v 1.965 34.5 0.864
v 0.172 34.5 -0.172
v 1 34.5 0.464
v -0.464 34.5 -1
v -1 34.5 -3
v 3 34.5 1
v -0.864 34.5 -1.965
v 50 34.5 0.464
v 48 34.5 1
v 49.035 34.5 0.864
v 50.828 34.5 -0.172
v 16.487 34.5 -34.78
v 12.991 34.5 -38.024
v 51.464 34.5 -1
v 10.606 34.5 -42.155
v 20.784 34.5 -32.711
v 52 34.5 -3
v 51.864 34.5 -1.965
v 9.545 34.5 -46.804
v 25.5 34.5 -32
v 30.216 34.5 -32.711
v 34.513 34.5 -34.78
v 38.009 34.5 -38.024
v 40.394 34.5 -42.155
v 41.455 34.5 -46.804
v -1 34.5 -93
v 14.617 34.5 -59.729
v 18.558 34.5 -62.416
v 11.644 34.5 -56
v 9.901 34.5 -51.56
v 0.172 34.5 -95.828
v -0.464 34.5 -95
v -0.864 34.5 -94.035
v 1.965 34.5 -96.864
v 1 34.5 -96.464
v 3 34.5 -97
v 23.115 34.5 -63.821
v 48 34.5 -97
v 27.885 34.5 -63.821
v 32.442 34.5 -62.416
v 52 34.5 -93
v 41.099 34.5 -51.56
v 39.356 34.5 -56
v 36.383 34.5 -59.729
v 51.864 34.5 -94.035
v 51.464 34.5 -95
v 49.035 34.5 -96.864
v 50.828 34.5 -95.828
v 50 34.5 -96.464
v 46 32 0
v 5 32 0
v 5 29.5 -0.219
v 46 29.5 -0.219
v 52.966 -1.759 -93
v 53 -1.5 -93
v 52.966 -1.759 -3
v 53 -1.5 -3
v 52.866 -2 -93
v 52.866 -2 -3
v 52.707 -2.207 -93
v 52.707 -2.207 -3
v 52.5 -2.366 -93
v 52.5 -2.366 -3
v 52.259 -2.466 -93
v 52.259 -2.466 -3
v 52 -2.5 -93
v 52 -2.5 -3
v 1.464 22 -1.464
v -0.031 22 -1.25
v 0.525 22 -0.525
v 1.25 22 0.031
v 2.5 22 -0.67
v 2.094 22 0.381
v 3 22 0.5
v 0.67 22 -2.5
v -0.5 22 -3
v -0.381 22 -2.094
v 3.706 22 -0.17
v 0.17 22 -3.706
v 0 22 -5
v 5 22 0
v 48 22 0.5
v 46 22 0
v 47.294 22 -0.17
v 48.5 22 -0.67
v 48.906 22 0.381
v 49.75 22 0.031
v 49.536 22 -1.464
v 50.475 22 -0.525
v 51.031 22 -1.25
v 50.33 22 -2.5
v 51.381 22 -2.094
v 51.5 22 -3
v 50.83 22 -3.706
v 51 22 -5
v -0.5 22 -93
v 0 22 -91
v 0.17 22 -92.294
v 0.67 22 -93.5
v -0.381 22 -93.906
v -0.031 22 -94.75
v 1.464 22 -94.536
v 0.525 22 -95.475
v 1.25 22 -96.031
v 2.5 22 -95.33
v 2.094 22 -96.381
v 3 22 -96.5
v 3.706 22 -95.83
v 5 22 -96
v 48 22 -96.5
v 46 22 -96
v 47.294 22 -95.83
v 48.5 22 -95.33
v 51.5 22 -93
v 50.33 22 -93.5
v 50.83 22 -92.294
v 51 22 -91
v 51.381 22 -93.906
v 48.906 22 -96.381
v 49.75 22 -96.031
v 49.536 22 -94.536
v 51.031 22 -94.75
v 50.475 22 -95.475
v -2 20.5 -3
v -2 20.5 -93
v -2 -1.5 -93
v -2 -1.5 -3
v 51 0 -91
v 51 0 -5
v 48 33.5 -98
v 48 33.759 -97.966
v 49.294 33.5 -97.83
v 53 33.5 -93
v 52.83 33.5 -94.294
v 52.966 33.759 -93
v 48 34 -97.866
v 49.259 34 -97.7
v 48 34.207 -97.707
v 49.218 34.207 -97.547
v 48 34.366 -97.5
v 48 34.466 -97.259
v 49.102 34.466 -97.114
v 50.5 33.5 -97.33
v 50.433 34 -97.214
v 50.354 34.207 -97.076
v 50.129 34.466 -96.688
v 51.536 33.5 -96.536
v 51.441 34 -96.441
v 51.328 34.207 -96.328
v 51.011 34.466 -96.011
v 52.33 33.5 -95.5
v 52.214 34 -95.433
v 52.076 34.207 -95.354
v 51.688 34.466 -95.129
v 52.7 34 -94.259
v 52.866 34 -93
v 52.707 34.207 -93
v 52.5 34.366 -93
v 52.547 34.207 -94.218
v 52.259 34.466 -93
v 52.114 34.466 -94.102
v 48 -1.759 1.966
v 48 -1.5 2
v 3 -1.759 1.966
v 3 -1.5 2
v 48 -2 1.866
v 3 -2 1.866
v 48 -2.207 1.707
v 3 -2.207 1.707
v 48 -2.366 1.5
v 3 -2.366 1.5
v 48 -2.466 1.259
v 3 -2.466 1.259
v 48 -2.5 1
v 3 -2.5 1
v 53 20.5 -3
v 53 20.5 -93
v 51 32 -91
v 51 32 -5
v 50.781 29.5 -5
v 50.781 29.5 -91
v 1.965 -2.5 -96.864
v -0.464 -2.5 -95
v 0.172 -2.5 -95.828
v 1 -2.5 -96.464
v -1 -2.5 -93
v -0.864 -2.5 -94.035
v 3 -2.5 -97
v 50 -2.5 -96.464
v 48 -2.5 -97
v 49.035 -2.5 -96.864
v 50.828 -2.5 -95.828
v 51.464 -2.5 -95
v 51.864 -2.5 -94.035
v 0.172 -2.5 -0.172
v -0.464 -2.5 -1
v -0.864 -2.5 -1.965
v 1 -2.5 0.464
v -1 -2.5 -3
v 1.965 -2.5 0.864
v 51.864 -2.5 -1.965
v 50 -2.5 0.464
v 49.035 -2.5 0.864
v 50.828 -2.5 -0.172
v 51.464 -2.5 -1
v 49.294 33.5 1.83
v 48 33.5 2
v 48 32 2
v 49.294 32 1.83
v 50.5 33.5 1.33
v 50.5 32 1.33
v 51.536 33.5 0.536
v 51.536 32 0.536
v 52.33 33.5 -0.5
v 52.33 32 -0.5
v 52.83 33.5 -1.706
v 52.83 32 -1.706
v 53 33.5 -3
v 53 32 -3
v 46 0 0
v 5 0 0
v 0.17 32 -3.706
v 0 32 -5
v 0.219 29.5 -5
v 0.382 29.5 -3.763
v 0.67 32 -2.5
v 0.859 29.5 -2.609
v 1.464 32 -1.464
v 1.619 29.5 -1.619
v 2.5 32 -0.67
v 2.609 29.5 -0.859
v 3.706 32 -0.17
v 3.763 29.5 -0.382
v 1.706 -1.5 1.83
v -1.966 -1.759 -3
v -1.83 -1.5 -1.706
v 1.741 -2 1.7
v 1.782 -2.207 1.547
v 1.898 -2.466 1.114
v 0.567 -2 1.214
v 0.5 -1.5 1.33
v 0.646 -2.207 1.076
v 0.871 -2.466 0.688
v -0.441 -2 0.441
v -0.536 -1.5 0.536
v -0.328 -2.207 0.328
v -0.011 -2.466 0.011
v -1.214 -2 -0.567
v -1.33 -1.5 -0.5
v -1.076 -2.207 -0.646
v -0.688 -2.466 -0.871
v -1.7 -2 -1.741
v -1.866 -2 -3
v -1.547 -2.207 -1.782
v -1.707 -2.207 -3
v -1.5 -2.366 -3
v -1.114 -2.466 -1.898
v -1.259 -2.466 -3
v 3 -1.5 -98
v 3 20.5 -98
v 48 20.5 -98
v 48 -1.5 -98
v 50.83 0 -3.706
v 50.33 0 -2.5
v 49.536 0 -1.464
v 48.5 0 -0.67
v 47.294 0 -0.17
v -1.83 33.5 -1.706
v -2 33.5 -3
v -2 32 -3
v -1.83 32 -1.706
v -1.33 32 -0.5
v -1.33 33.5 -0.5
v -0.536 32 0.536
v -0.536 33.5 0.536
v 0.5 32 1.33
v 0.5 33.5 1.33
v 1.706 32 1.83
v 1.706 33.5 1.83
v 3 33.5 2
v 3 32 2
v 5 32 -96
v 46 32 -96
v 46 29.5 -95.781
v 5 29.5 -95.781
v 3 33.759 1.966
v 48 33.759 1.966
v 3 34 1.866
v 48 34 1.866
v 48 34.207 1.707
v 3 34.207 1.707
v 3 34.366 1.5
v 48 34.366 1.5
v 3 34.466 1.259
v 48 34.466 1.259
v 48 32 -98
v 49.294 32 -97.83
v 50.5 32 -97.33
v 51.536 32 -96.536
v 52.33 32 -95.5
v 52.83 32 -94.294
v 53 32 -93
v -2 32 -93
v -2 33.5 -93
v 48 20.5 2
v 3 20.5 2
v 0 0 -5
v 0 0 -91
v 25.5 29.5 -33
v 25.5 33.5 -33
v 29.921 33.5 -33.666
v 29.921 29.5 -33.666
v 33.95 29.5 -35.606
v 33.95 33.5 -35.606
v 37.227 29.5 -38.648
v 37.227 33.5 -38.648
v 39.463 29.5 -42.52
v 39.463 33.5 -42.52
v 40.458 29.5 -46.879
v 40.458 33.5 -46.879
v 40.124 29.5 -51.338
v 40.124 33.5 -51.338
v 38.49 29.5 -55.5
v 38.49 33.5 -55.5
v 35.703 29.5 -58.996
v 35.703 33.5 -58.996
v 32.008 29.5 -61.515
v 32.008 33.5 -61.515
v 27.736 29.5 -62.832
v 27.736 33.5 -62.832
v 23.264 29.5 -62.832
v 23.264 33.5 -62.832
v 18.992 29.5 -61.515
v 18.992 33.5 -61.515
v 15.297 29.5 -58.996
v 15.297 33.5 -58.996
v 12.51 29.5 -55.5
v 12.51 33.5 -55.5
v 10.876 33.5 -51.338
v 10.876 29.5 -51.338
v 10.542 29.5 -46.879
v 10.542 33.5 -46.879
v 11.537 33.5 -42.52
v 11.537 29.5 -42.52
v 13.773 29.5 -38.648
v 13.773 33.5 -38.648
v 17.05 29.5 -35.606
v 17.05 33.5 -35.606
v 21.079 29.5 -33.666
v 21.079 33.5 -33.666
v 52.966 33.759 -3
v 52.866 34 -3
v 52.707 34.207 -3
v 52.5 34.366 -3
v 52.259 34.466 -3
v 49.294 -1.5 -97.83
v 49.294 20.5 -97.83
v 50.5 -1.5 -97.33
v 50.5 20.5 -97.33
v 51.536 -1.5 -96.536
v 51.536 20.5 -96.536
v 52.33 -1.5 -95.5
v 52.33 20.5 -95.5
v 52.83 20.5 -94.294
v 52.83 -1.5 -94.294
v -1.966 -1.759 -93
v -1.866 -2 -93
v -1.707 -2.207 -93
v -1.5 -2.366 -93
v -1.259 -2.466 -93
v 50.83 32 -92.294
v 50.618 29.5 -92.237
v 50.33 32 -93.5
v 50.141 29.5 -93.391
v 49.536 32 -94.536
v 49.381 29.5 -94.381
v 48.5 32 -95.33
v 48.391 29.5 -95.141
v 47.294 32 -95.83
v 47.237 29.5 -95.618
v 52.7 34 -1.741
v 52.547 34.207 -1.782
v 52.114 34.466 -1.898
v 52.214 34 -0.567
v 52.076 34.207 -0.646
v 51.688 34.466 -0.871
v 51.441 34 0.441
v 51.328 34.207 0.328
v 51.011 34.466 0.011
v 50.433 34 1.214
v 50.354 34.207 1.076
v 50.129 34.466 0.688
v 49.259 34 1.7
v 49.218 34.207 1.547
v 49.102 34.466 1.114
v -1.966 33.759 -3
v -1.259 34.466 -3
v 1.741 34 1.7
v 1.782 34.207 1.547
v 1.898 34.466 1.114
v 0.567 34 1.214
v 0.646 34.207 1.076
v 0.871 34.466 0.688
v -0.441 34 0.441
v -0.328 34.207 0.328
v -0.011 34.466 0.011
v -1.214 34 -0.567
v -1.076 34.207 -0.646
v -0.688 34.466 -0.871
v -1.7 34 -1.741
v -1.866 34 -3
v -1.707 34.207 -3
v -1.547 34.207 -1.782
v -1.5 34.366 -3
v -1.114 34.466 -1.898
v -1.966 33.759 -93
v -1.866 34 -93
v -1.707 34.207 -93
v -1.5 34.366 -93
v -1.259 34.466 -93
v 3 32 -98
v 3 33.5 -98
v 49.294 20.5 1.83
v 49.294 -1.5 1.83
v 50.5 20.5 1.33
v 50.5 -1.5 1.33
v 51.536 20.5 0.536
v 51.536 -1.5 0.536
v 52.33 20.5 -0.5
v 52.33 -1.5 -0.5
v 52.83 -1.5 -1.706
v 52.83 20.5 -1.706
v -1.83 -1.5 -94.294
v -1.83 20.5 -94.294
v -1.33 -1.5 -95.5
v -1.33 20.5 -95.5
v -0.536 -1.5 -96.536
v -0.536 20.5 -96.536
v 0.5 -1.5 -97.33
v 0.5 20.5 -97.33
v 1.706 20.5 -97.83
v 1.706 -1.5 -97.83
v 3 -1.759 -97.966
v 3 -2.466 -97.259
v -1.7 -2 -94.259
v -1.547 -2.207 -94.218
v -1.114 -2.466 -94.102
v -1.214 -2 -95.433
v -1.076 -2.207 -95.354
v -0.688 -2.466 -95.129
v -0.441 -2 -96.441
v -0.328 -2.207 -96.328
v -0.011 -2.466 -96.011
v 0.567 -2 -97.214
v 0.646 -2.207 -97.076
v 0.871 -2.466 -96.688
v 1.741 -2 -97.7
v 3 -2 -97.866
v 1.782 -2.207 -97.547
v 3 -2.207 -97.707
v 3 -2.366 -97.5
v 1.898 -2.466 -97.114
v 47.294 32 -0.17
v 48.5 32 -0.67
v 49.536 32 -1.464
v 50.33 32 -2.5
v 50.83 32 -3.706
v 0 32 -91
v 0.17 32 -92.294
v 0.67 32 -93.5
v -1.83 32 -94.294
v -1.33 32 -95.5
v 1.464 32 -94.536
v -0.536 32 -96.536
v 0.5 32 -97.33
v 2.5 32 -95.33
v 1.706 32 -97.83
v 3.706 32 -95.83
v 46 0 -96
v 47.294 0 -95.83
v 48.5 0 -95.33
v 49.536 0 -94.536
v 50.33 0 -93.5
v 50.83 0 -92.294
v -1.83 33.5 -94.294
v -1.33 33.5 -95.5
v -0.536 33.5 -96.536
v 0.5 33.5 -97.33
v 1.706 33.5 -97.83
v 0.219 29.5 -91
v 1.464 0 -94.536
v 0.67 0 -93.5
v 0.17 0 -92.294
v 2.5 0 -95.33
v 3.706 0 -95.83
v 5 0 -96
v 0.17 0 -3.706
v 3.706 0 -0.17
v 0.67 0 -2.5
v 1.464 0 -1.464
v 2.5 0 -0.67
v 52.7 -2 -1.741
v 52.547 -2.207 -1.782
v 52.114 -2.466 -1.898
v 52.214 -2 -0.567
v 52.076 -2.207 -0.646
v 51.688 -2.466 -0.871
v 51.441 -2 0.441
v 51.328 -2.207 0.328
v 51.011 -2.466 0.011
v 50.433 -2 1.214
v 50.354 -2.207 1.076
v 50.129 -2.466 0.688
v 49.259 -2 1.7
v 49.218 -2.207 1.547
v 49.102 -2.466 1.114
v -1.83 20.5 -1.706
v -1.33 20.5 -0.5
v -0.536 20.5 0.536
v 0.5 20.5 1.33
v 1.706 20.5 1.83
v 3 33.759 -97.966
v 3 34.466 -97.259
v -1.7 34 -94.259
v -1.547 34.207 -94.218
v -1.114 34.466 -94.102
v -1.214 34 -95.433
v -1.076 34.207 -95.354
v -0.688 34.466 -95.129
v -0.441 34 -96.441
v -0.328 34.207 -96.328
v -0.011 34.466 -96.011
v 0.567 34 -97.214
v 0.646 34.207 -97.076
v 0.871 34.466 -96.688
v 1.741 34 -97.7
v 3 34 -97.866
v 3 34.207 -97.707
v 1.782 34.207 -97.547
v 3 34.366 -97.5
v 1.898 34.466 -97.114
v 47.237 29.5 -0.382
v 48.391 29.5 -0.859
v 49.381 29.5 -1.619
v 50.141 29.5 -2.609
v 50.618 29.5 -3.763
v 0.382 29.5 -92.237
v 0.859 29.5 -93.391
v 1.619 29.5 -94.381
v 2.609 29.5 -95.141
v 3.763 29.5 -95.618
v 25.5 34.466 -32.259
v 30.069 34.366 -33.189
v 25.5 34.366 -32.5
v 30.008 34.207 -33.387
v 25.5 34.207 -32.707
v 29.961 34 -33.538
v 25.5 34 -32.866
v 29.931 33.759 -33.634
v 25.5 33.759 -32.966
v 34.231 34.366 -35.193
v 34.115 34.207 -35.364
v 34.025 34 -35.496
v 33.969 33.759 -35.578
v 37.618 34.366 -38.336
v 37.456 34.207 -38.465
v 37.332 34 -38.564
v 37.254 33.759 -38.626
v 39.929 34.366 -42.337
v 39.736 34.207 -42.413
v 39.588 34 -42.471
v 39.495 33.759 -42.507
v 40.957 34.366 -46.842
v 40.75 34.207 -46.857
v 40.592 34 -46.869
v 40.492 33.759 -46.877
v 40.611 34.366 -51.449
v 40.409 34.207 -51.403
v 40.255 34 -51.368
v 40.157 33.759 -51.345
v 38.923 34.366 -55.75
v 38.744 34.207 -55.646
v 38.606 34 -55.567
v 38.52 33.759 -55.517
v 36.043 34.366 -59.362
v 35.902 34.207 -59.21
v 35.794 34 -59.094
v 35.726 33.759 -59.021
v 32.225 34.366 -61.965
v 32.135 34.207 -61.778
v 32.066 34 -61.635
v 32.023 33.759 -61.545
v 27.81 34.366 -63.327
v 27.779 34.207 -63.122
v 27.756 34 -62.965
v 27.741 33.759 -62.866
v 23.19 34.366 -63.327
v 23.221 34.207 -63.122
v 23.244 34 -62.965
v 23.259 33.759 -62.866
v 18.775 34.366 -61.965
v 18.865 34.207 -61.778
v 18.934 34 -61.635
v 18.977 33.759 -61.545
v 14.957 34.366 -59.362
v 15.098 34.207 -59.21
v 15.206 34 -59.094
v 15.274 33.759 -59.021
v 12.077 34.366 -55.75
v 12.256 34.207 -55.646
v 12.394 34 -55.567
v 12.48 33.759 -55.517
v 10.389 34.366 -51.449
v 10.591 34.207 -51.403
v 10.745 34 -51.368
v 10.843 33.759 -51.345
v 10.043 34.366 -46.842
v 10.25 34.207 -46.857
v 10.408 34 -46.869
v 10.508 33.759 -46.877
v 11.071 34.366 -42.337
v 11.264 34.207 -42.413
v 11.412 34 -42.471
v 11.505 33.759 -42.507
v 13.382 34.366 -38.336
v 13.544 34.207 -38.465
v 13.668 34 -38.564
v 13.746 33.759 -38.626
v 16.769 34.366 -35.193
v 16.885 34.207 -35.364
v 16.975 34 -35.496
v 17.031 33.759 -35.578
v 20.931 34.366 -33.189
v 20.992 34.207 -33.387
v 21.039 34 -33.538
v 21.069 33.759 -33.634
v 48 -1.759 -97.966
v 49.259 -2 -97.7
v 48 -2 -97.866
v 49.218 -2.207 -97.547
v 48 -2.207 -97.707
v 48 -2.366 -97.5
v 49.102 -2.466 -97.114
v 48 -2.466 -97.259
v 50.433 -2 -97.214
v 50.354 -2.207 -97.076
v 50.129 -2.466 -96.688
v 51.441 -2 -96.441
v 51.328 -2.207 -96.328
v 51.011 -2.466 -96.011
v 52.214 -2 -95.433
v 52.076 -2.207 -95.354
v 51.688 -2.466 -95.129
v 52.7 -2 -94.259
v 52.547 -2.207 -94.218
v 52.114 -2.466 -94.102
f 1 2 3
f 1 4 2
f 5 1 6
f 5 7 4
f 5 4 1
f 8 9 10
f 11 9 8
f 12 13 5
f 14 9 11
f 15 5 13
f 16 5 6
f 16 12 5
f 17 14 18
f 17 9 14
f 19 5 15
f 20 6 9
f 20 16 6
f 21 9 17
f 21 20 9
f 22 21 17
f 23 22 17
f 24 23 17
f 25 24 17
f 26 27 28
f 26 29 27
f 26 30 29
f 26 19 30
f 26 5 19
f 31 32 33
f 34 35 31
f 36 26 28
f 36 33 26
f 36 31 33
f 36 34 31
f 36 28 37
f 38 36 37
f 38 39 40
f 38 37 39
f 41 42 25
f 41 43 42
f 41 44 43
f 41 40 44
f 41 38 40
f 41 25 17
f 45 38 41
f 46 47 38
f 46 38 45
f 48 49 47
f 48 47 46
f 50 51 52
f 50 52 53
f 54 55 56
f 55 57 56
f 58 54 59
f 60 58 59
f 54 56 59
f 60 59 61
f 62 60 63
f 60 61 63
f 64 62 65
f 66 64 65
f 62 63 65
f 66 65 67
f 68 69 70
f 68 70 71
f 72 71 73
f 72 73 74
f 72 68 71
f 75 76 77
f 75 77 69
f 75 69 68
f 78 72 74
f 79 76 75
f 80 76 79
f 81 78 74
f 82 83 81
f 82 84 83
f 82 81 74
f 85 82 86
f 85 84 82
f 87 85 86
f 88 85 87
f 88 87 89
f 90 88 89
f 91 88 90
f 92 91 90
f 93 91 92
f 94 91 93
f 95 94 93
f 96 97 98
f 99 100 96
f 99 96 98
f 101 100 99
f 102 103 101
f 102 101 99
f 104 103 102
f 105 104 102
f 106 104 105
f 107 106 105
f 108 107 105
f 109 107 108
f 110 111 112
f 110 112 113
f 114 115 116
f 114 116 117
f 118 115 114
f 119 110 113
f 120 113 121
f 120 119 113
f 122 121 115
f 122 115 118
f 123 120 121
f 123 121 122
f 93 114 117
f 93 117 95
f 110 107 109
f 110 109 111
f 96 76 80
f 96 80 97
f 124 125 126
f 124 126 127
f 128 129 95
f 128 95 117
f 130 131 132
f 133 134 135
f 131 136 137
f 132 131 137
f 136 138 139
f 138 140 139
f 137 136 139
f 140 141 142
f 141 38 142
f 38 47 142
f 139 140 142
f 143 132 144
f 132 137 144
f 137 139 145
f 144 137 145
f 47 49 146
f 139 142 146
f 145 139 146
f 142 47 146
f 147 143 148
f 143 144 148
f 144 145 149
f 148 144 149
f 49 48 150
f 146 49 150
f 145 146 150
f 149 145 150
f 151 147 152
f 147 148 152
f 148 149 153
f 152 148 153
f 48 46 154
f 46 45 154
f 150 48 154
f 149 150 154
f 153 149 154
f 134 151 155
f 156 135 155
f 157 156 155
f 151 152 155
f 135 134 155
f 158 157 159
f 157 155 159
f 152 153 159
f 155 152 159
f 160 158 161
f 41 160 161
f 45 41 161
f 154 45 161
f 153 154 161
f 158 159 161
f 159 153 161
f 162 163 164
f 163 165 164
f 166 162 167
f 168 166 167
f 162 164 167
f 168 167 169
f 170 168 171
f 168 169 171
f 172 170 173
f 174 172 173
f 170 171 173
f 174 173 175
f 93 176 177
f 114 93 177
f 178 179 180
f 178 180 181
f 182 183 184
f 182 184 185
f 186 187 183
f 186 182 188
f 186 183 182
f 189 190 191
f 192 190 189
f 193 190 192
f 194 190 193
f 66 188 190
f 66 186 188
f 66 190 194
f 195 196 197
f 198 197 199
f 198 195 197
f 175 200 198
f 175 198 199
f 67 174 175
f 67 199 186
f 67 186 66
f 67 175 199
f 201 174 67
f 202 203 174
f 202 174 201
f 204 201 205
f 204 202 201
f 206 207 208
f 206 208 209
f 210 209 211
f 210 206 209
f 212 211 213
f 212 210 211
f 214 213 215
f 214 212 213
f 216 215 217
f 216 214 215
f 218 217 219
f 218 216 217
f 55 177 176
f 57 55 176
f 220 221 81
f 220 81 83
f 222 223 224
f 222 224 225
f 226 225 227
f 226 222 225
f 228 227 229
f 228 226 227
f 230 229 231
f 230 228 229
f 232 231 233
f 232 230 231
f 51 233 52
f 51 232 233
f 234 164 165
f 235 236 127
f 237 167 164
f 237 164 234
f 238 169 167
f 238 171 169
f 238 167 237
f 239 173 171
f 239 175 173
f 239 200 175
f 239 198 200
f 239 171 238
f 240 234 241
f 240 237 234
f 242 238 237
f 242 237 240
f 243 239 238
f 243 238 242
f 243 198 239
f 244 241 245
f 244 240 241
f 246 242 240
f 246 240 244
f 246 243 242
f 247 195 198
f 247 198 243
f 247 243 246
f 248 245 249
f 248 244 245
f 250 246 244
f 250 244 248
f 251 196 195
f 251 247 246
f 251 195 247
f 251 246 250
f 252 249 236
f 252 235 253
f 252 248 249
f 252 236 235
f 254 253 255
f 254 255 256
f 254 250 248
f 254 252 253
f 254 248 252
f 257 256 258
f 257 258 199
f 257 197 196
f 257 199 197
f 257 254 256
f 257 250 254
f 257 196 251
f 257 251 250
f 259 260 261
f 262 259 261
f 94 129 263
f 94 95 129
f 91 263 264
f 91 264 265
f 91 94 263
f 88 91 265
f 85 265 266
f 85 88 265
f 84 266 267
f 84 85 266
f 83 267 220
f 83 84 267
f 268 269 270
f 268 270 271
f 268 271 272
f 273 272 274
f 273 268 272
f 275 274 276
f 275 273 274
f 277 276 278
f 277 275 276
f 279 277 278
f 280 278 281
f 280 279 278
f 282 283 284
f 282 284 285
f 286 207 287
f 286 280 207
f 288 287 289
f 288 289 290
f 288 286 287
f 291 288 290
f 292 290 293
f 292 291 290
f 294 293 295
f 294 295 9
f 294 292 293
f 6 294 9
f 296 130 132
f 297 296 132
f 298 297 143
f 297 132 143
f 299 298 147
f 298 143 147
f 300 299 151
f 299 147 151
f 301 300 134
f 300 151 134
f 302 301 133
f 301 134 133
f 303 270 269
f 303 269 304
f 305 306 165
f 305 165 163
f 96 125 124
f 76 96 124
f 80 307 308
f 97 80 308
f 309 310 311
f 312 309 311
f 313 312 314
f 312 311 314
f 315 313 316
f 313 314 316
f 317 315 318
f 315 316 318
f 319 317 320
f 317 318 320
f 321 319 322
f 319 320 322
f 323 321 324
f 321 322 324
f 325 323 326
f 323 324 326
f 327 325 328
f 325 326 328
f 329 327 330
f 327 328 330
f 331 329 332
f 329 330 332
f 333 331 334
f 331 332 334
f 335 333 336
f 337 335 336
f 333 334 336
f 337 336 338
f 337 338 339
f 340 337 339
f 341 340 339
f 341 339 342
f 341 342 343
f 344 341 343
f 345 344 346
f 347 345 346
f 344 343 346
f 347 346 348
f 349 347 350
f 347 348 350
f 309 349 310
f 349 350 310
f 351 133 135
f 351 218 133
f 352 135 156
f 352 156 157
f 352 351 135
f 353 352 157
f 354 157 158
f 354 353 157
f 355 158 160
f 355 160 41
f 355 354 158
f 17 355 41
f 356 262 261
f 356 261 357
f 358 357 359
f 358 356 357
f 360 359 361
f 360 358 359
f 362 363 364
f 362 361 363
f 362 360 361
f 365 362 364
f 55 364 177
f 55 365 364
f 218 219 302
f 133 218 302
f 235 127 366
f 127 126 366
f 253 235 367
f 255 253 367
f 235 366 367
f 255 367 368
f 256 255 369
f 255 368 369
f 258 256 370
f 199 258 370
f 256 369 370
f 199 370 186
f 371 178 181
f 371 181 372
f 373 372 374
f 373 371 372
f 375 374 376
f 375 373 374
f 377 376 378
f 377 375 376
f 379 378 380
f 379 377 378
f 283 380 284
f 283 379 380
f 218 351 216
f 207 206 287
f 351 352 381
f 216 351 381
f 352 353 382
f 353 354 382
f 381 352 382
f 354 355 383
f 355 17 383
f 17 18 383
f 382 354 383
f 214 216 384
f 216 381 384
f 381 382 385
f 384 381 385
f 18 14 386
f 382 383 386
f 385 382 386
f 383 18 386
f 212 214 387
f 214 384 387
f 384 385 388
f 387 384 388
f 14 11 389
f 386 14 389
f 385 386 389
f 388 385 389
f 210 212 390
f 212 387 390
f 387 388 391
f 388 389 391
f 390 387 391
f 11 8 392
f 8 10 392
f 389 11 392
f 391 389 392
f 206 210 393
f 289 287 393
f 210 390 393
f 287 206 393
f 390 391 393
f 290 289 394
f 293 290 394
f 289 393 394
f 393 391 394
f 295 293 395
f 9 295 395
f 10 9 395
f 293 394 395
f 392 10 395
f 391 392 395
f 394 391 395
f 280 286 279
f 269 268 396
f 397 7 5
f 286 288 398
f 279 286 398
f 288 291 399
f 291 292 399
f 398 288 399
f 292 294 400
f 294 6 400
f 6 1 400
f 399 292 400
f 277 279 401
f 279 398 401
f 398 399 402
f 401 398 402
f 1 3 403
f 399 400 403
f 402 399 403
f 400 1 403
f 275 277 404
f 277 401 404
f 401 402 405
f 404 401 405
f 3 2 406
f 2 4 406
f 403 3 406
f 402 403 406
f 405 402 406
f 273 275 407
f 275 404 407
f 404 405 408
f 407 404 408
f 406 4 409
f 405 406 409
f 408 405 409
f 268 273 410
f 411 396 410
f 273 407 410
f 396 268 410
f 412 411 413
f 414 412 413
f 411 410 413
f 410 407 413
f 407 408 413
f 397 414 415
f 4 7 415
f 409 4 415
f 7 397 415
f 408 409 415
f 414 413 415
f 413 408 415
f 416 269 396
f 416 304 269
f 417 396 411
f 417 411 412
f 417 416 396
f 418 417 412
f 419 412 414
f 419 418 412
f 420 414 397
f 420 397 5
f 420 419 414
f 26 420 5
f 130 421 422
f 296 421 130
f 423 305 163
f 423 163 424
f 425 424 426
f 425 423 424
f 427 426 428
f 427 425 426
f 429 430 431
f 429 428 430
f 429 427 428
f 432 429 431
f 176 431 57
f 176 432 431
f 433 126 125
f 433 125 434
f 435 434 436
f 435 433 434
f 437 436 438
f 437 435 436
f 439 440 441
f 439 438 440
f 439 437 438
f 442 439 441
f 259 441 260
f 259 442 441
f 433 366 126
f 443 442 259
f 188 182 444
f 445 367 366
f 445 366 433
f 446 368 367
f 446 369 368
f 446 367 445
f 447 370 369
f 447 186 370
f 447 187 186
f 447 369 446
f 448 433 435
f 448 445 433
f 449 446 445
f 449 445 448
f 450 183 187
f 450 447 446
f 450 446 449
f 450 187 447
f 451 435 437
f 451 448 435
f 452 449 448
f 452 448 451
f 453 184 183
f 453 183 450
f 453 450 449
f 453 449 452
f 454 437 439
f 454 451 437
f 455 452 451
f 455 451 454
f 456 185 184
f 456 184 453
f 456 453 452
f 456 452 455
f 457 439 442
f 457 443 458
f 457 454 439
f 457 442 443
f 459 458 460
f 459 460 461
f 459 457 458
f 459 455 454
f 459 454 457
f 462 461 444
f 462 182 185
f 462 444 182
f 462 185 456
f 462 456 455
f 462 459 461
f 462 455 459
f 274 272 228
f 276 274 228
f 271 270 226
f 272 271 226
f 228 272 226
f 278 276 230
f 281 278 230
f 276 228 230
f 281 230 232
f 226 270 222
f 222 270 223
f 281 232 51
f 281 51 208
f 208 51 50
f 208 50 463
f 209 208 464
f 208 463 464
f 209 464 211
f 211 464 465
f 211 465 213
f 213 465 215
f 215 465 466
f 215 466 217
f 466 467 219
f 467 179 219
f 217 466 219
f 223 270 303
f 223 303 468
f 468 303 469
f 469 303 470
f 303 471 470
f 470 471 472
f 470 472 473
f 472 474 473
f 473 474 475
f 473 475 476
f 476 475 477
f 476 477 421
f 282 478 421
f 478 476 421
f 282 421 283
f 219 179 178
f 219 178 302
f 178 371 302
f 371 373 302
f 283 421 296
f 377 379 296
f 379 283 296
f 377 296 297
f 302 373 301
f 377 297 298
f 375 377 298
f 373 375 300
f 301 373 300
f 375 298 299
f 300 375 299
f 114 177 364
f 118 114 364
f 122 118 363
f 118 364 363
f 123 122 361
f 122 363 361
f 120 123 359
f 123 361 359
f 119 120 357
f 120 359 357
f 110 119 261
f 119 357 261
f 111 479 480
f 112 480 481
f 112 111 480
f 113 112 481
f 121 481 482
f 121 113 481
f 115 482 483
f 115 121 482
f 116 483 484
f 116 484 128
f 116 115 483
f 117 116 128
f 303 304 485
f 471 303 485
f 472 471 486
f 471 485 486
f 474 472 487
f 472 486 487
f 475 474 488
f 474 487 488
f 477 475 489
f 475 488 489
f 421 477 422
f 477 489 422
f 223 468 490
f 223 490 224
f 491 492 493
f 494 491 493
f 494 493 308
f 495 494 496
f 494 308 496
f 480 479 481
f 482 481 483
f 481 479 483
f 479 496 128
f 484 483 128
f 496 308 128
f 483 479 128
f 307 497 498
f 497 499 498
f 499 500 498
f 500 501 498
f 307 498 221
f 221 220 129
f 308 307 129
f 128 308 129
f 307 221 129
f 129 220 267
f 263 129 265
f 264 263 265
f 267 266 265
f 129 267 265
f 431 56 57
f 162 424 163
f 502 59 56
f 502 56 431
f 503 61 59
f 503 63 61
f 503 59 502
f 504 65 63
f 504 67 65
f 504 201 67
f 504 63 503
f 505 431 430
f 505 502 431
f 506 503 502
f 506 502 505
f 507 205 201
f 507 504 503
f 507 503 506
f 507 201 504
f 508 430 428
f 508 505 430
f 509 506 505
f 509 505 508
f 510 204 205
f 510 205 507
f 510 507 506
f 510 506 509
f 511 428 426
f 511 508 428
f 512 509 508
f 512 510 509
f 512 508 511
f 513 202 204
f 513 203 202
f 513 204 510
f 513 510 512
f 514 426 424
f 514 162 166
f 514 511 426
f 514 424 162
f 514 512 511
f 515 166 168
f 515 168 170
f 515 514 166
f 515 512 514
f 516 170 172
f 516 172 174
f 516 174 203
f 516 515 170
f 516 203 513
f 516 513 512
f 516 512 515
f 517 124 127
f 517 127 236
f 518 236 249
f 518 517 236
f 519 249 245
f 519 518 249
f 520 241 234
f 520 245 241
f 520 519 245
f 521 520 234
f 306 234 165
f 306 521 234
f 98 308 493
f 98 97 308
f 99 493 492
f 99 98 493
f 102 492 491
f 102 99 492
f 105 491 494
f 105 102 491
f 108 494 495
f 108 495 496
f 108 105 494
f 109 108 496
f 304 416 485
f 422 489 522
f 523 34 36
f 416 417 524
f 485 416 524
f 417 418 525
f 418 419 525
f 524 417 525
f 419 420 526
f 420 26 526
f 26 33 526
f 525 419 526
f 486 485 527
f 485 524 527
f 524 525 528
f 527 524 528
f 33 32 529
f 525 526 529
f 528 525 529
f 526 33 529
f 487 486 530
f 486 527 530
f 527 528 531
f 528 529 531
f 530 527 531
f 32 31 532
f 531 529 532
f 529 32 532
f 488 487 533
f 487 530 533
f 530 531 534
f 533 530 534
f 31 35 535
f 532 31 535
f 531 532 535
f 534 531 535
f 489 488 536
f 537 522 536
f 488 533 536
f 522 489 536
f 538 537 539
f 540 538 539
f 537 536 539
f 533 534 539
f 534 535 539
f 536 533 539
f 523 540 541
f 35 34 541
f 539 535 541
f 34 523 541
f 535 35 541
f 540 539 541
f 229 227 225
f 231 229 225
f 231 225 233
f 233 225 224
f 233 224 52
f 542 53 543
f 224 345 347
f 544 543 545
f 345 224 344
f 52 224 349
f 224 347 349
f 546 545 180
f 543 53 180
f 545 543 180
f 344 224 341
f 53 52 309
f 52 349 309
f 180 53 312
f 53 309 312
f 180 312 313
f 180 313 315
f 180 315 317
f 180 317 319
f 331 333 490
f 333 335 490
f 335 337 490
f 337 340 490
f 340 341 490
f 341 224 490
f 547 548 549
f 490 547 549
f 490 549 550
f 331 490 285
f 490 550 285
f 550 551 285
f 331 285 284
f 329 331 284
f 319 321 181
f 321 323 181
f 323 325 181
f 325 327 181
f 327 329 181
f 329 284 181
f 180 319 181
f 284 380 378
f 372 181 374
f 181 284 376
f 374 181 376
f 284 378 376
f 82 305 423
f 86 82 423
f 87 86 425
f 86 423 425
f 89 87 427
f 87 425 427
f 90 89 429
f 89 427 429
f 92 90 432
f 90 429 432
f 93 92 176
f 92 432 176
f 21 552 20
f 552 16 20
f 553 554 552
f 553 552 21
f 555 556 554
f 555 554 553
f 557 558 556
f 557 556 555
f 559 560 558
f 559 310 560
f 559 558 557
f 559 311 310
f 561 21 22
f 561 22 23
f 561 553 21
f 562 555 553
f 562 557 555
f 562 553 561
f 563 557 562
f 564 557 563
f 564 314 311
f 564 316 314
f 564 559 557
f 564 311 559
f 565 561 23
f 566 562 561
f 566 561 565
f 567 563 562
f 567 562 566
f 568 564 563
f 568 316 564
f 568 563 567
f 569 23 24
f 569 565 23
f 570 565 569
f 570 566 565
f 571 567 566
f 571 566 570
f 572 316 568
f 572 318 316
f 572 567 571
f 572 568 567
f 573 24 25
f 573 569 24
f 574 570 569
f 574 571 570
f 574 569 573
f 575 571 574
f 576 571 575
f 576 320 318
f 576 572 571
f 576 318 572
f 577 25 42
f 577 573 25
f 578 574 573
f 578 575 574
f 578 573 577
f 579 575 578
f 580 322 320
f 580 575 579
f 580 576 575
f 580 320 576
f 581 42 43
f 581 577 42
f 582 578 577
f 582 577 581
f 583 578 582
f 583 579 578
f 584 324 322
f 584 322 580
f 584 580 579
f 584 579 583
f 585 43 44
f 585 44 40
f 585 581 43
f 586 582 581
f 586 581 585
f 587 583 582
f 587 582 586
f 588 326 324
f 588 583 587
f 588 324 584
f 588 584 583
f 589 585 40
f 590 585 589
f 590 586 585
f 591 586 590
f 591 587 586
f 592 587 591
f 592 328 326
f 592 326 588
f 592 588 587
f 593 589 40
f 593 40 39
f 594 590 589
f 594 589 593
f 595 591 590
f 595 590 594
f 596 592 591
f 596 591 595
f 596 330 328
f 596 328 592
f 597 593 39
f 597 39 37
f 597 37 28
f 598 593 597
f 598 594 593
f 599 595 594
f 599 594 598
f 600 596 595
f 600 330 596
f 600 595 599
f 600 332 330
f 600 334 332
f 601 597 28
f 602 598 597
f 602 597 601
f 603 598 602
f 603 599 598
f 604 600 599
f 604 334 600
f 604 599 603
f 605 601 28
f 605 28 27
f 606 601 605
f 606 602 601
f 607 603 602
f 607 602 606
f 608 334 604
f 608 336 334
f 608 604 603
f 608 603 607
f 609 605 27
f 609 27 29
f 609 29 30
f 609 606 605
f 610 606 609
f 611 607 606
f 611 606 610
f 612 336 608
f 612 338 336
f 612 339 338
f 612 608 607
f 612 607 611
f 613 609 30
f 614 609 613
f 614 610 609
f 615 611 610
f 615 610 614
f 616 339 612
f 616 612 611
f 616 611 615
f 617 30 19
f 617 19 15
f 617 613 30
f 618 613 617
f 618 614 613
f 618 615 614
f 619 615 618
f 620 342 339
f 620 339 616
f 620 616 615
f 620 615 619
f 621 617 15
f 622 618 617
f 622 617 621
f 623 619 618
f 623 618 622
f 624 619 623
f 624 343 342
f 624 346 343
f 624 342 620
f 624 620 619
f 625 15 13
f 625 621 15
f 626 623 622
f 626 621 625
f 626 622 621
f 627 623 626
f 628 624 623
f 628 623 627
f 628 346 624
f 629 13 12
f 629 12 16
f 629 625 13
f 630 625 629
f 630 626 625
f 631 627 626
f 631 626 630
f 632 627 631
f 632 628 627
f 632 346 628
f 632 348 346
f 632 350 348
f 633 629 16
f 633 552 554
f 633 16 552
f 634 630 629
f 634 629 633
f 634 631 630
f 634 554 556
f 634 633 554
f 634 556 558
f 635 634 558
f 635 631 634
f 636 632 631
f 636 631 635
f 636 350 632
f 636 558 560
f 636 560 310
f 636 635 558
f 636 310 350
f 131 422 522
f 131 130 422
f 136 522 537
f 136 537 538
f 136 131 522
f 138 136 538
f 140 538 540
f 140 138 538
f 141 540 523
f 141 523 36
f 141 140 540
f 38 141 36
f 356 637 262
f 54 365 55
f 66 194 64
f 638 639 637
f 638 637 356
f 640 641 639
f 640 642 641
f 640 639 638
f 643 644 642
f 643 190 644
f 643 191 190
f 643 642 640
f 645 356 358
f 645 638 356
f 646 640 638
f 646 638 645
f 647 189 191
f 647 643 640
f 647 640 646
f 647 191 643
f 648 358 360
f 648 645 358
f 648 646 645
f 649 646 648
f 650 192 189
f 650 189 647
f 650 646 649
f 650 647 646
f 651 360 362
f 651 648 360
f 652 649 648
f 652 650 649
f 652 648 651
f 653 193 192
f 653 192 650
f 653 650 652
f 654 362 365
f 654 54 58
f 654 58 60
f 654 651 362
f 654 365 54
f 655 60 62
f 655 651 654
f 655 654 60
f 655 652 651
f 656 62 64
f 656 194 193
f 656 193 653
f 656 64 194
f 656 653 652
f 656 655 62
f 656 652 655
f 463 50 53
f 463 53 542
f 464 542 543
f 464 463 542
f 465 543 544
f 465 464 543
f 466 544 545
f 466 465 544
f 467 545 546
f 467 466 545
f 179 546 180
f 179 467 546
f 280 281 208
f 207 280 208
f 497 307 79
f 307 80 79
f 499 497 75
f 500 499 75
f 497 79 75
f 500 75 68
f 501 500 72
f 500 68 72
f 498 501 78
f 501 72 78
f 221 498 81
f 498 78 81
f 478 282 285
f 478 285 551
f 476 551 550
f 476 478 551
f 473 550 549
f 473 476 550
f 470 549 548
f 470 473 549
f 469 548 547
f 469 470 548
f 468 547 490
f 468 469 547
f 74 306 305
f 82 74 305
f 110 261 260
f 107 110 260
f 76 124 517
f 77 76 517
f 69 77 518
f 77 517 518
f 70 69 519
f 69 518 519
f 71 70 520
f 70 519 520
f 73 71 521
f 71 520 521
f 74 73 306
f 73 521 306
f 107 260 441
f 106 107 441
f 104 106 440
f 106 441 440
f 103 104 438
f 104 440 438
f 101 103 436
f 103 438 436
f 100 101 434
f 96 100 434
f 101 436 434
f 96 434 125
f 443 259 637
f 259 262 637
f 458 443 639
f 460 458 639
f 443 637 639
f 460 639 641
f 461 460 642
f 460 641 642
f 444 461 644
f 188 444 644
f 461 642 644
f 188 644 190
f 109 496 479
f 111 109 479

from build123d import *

# Parameters (mm, degrees)
SKETCH1_W           = 55
SKETCH1_H           = 100
SKETCH1_W_2         = 51
SKETCH1_H_2         = 96
BOSS_EXTRUDE1_DEPTH = 22
SKETCH2_W           = 55
SKETCH2_H           = 100
BOSS_EXTRUDE2_DEPTH = 2.5
FILLET1_R           = 5
SKETCH3_W           = 55
SKETCH3_H           = 100
BOSS_EXTRUDE3_DEPTH = 2.5
BOSS_EXTRUDE4_DEPTH = 2.5
BOSS_EXTRUDE4_DRAFT = -5
FILLET2_R           = 5
FILLET3_R           = 1
FILLET4_R           = 5
CHAMFER1_SIZE       = 1.5
FILLET5_R           = 1
SKETCH4_R           = 15
CUT_EXTRUDE1_DEPTH  = 5
FILLET6_R           = 1


with BuildPart() as part:
    # Sketch1 → Boss-Extrude1 (new body)
    with BuildSketch(Plane(origin=(0, 0, 0), x_dir=(1, 0, 0), z_dir=(0, 1, 0))):
        with Locations((25.5, 48)):
            Rectangle(SKETCH1_W, SKETCH1_H)
        with Locations((25.5, 48)):
            Rectangle(SKETCH1_W_2, SKETCH1_H_2, mode=Mode.SUBTRACT)
    extrude(amount=BOSS_EXTRUDE1_DEPTH)

    # Sketch2 → Boss-Extrude2 (add)
    with BuildSketch(Plane.XZ):
        with Locations((25.5, -48)):
            Rectangle(SKETCH2_W, SKETCH2_H)
    extrude(amount=BOSS_EXTRUDE2_DEPTH)

    # Fillet1
    fillet1_edges = [part.edges().sort_by_distance(p)[0] for p in [
        (0, 11, -96),
        (0, 11, 0),
        (51, 11, 0),
        (51, 11, -96),
    ]]
    fillet(fillet1_edges, radius=FILLET1_R)

    # Fillet4
    fillet4_edges = [part.edges().sort_by_distance(p)[0] for p in [
        (-2, 9.75, -98),
        (53, 9.75, -98),
        (53, 9.75, 2),
        (-2, 9.75, 2),
    ]]
    fillet(fillet4_edges, radius=FILLET4_R)

    # Chamfer1
    chamfer1_edges = [part.edges().sort_by_distance(p)[0] for p in [
        (53, 22, -48),
        (25.5, 22, 2),
        (-2, 22, -48),
        (25.5, 22, -98),
        (-0.535533906, 22, 0.535533906),
        (-0.535533906, 22, -96.535533906),
        (51.535533906, 22, -96.535533906),
        (51.535533906, 22, 0.535533906),
    ]]
    chamfer(chamfer1_edges, length=CHAMFER1_SIZE)

    # Fillet5
    fillet5_edges = [part.edges().sort_by_distance(p)[0] for p in [
        (53, -2.5, -48),
        (25.5, -2.5, 2),
        (-2, -2.5, -48),
        (25.5, -2.5, -98),
        (-0.535533906, -2.5, 0.535533906),
        (-0.535533906, -2.5, -96.535533906),
        (51.535533906, -2.5, -96.535533906),
        (51.535533906, -2.5, 0.535533906),
    ]]
    fillet(fillet5_edges, radius=FILLET5_R)


with BuildPart() as body_2:
    # Sketch3 → Boss-Extrude3 (new body)
    with BuildSketch(Plane(origin=(0, 32, 0), x_dir=(1, 0, 0), z_dir=(0, 1, 0))):
        with Locations((25.5, 48)):
            Rectangle(SKETCH3_W, SKETCH3_H)
    extrude(amount=BOSS_EXTRUDE3_DEPTH)


with BuildPart() as boss_extrude4_tool:
    # Sketch3<3> → Boss-Extrude4 (with draft: the straight prism first)
    with BuildSketch(Plane(origin=(0, 32, 0), x_dir=(1, 0, 0), z_dir=(0, 1, 0))):
        with BuildLine():
            Line((51, 5), (51, 91))
            ThreePointArc((51, 91), (49.535533906, 94.535533906), (46, 96))
            Line((46, 96), (5, 96))
            ThreePointArc((5, 96), (1.464466094, 94.535533906), (0, 91))
            Line((0, 91), (0, 5))
            ThreePointArc((0, 5), (1.464466094, 1.464466094), (5, 0))
            Line((5, 0), (46, 0))
            ThreePointArc((46, 0), (49.535533906, 1.464466094), (51, 5))
        make_face()
    extrude(amount=-BOSS_EXTRUDE4_DEPTH)
    # Boss-Extrude4: the draft: its side faces are tilted about the plane it starts from
    boss_extrude4_sides = [boss_extrude4_tool.faces().sort_by_distance(p)[0] for p in [
        (51, 30.75, -48),
        (49.535533906, 30.75, -94.535533906),
        (25.5, 30.75, -96),
        (1.464466094, 30.75, -94.535533906),
        (0, 30.75, -48),
        (1.464466094, 30.75, -1.464466094),
        (25.5, 30.75, 0),
        (49.535533906, 30.75, -1.464466094),
    ]]
    draft(boss_extrude4_sides, Plane(origin=(0, 32, 0), x_dir=(1, 0, 0), z_dir=(0, 1, 0)), BOSS_EXTRUDE4_DRAFT)


with BuildPart() as body_2_1:
    add(body_2.part)

    # Boss-Extrude4: add boss_extrude4_tool
    add(boss_extrude4_tool.part)

    # Fillet2
    fillet2_edges = [body_2_1.edges().sort_by_distance(p)[0] for p in [
        (53, 33.25, -98),
        (53, 33.25, 2),
        (-2, 33.25, 2),
        (-2, 33.25, -98),
    ]]
    fillet(fillet2_edges, radius=FILLET2_R)

    # Fillet3
    fillet3_edges = [body_2_1.edges().sort_by_distance(p)[0] for p in [
        (-2, 34.5, -48),
        (25.5, 34.5, -98),
        (25.5, 34.5, 2),
        (53, 34.5, -48),
        (-0.535533906, 34.5, 0.535533906),
        (51.535533906, 34.5, 0.535533906),
        (51.535533906, 34.5, -96.535533906),
        (-0.535533906, 34.5, -96.535533906),
    ]]
    fillet(fillet3_edges, radius=FILLET3_R)

    # Sketch4 → Cut-Extrude1 (cut)
    with BuildSketch(Plane(origin=(0, 34.5, 0), x_dir=(1, 0, 0), z_dir=(0, 1, 0))):
        with Locations(Location((25.5, 48, 0), (0, 0, 270))):
            Circle(SKETCH4_R)
    extrude(amount=-CUT_EXTRUDE1_DEPTH, mode=Mode.SUBTRACT)

    # Fillet6
    fillet6_edges = [body_2_1.edges().sort_by_distance(p)[0] for p in [
        (25.5, 34.5, -63),
    ]]
    fillet(fillet6_edges, radius=FILLET6_R)


solid = Compound([part.part, body_2_1.part])
